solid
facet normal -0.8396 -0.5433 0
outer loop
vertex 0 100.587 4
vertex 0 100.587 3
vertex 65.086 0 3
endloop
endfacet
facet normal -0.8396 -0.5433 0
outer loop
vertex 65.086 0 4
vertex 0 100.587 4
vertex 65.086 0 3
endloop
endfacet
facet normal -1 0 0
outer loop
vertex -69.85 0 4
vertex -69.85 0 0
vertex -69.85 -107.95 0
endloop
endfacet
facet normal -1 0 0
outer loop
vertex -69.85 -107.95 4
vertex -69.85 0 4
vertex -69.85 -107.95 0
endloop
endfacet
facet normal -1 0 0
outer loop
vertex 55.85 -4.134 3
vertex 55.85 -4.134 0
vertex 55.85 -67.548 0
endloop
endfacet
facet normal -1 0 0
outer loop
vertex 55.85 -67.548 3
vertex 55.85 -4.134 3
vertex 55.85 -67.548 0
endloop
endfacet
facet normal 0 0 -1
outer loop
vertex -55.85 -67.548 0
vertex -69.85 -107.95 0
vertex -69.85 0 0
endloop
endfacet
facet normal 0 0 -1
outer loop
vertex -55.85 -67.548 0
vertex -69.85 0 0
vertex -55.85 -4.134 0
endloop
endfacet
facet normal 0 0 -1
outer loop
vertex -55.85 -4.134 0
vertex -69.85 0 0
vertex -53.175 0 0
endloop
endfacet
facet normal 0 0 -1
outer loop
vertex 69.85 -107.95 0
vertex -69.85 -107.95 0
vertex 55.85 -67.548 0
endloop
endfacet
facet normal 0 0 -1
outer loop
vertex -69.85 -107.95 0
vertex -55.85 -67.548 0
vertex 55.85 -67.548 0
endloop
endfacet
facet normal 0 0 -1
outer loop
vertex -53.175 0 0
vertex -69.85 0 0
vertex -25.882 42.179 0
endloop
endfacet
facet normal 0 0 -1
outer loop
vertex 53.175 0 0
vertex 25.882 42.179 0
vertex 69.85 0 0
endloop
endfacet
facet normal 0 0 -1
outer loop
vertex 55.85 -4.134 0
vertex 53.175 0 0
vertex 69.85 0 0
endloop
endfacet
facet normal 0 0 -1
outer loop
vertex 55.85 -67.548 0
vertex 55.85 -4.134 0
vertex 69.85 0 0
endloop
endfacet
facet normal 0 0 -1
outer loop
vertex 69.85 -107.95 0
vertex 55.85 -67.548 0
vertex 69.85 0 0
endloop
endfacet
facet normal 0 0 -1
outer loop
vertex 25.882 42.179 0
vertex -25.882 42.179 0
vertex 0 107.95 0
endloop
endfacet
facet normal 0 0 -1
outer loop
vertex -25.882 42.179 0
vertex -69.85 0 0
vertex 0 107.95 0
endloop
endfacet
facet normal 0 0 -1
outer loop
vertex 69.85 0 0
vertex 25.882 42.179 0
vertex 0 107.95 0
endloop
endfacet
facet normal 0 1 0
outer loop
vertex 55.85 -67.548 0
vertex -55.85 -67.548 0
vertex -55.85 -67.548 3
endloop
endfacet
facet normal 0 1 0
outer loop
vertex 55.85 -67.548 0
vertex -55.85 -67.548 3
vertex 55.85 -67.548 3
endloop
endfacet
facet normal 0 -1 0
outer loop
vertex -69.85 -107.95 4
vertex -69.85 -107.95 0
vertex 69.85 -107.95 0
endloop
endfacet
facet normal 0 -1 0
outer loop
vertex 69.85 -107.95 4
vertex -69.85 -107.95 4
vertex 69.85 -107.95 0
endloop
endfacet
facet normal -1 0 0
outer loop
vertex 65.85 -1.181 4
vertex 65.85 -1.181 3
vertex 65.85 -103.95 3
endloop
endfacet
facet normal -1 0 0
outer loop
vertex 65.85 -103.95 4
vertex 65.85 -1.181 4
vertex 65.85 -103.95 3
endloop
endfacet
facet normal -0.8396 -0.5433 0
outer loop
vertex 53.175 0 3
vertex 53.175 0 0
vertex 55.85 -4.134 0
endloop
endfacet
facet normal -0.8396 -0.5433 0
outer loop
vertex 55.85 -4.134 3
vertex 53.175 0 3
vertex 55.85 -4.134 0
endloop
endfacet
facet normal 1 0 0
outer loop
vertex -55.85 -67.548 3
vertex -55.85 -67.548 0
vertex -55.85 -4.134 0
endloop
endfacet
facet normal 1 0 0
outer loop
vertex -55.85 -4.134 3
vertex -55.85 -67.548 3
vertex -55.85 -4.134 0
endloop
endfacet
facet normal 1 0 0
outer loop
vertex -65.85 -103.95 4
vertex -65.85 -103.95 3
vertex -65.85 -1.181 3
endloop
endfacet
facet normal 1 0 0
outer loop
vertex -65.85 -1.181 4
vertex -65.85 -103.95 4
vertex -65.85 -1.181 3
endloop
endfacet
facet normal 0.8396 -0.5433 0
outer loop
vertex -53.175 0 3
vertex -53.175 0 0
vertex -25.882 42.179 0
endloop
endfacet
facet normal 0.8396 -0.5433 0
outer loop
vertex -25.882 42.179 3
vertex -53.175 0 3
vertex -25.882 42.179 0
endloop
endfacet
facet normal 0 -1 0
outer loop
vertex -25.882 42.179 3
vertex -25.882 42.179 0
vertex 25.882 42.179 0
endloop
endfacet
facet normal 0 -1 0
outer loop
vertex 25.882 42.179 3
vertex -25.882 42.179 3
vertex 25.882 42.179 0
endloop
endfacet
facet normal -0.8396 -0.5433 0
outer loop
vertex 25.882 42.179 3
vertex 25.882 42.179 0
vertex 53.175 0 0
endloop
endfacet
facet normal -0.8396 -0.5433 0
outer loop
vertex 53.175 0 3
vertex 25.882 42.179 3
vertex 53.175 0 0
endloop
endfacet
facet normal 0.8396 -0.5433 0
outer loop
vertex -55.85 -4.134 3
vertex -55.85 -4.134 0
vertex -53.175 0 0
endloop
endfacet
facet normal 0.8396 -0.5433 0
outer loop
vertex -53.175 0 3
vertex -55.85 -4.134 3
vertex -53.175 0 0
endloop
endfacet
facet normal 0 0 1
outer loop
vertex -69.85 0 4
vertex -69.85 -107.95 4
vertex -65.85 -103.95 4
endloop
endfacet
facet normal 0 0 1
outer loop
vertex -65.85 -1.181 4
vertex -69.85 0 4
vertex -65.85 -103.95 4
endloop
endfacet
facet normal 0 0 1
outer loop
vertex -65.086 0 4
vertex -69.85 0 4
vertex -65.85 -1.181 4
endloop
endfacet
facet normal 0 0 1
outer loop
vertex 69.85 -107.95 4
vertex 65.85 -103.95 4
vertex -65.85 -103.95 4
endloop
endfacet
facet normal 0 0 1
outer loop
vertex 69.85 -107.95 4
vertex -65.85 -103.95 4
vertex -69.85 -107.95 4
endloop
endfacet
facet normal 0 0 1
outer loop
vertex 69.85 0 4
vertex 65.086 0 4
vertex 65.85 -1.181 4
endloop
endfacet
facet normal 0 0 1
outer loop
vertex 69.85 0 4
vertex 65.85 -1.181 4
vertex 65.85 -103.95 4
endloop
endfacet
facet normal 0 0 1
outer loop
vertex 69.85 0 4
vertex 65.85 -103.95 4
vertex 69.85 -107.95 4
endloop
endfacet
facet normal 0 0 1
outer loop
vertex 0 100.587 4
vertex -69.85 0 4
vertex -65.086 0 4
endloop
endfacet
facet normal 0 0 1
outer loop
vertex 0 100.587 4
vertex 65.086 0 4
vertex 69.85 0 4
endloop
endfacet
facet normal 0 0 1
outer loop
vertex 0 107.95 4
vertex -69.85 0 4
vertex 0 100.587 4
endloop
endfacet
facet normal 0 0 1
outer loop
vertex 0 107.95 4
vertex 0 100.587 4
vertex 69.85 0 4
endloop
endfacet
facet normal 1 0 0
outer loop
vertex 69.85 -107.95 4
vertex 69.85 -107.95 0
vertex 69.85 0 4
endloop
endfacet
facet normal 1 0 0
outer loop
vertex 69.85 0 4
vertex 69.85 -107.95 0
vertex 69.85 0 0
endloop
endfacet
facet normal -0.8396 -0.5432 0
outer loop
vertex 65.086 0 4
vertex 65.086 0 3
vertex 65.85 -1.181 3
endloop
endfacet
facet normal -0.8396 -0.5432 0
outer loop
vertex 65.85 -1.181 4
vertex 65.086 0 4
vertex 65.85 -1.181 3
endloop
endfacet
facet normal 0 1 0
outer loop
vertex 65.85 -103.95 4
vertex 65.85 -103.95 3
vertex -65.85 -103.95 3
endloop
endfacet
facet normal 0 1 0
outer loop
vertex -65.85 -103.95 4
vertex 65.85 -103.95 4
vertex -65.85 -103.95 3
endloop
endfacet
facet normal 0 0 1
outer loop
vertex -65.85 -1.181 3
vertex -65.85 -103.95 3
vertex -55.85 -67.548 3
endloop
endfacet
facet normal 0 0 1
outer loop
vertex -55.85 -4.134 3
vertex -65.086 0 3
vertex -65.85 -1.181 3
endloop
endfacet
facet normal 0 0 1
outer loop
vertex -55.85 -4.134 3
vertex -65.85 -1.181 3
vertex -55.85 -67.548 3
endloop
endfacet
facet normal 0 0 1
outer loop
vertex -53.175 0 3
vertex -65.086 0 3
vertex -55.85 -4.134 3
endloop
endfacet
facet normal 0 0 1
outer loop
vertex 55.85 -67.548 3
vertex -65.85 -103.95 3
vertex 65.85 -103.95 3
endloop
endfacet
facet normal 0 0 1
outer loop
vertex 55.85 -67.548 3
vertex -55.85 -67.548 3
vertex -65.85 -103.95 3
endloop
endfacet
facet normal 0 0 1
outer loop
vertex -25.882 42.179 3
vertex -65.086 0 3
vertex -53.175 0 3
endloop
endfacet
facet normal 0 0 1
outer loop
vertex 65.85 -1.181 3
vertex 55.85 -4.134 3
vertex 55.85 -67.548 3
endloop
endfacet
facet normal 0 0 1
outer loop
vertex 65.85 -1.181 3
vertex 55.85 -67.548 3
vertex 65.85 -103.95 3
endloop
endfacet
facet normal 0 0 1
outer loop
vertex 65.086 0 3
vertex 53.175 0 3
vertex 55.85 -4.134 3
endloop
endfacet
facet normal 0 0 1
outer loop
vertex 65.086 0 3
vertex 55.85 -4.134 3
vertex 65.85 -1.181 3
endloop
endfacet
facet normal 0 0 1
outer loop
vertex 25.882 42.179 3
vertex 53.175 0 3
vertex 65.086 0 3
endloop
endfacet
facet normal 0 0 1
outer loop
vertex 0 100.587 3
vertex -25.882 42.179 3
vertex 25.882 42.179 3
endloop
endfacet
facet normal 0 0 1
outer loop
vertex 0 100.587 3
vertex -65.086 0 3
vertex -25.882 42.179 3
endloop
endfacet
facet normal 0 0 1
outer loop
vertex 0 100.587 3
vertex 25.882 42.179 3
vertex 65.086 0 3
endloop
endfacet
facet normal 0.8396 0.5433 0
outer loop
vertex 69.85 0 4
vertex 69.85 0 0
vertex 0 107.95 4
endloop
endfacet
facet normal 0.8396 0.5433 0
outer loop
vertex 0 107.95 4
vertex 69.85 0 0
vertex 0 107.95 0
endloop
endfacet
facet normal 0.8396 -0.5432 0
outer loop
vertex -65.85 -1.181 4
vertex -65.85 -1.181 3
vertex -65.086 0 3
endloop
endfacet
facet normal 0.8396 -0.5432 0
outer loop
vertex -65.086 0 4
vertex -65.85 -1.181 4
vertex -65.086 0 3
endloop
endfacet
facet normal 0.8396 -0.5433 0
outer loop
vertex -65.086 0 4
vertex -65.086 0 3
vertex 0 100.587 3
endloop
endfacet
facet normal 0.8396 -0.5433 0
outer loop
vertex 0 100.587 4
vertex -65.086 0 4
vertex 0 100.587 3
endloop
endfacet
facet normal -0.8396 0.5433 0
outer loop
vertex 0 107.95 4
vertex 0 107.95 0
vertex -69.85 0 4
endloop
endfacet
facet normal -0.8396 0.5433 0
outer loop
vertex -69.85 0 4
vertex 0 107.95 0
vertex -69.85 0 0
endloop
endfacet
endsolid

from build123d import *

# Parameters (mm, degrees)
F0_W     = 111.7000012129
F0_H     = 26.4022397026
F1_DEPTH = 3
F2_DEPTH = 4


with BuildPart() as f1:
    # F0 (on Top) → F1 (new body)
    with BuildSketch(Plane.XY):
        Polygon((-53.1748010613, 0), (-65.0856580366, 0), (-65.8500006691, -1.1812567956), (-65.8500006691, -103.9500006691), (65.8500006691, -103.9500006691), (65.8500006691, -1.1812567956), (65.0856580366, 0), (53.1748010613, 0), (55.8500006065, -4.1343992971), (55.8500006065, -67.5477609038), (55.8500006065, -93.9500006065), (-55.8500006065, -93.9500006065), (-55.8500006065, -67.5477609038), (-55.8500006065, -4.1343992971), align=None)
        with Locations((0, -80.7488807551)):
            Rectangle(F0_W, F0_H)
        Polygon((0, 82.1792380038), (-25.8823529412, 42.1792380038), (25.8823529412, 42.1792380038), align=None)
        Polygon((0, 100.5869260566), (-65.0856580366, 0), (-53.1748010613, 0), (-25.8823529412, 42.1792380038), (0, 82.1792380038), (25.8823529412, 42.1792380038), (53.1748010613, 0), (65.0856580366, 0), align=None)
    extrude(amount=F1_DEPTH)

    # F0 (on Top) → F2 (join)
    with BuildSketch(Plane.XY):
        Polygon((-69.85, 0), (-69.85, -107.95), (69.85, -107.95), (69.85, 0), (65.0856580366, 0), (65.8500006691, -1.1812567956), (65.8500006691, -103.9500006691), (-65.8500006691, -103.9500006691), (-65.8500006691, -1.1812567956), (-65.0856580366, 0), align=None)
        Polygon((0, 107.95), (-69.85, 0), (-65.0856580366, 0), (0, 100.5869260566), (65.0856580366, 0), (69.85, 0), align=None)
    extrude(amount=F2_DEPTH)


solid = f1.part
